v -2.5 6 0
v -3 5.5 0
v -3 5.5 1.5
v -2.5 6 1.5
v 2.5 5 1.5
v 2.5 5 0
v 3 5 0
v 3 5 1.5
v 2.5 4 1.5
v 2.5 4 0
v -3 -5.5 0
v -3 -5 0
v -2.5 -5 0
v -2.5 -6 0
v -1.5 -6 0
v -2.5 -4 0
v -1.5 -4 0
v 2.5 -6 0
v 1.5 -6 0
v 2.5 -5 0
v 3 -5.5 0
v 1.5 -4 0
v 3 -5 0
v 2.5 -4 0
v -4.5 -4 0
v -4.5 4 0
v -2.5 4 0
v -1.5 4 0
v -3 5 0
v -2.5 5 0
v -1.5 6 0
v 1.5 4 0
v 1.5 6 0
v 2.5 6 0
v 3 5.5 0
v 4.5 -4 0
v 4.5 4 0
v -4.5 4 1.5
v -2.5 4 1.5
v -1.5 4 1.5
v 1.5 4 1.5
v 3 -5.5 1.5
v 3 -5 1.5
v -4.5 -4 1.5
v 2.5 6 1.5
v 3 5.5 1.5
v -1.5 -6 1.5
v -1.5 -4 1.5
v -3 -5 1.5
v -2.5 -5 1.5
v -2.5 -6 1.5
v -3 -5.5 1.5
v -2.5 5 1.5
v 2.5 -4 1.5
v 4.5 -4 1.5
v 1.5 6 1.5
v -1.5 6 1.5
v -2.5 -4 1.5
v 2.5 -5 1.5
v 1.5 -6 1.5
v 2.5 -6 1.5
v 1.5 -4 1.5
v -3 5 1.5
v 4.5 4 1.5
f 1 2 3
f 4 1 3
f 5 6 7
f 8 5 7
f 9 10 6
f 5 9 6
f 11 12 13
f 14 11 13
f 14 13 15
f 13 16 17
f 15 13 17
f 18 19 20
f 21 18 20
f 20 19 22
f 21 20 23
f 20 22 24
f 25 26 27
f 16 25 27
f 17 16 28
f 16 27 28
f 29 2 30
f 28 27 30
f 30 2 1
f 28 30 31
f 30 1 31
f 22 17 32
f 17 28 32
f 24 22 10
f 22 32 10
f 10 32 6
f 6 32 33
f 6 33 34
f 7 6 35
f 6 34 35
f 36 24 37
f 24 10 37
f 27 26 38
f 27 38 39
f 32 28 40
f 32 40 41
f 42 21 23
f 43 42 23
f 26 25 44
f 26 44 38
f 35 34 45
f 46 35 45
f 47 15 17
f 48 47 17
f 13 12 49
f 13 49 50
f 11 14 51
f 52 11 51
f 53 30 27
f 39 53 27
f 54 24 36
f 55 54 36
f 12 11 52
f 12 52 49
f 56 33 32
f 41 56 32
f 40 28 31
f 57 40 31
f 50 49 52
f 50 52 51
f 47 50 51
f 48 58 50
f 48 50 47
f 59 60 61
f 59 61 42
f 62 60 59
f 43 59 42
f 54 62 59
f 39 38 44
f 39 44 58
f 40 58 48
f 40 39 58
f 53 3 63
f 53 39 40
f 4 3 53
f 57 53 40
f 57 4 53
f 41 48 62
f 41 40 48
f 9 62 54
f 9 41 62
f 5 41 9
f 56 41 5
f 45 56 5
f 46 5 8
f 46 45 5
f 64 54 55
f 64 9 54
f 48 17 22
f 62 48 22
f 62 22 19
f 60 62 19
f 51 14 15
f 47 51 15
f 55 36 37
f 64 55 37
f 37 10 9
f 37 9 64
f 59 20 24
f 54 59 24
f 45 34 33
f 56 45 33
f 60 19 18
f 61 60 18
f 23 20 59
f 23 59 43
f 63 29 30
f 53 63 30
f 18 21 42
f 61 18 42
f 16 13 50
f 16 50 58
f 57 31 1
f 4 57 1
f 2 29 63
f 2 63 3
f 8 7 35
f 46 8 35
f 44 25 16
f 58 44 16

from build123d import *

# Parameters (mm, degrees)
F0_W     = 1
F0_H     = 1
F0_W_2   = 2
F0_H_2   = 8
F0_W_3   = 3
F0_W_4   = 0.5
F1_DEPTH = 1.5
F2_SIZE  = 0.5


with BuildPart() as f1:
    # F0 (on Top) → F1 (new body)
    with BuildSketch(Plane.XY):
        with Locations((-2, 4.5)):
            Rectangle(F0_W, F0_H)
        with Locations((2, 4.5)):
            Rectangle(F0_W, F0_H)
        with Locations((3.5, 0)):
            Rectangle(F0_W_2, F0_H_2)
        with Locations((2, 0)):
            Rectangle(F0_W, F0_H_2)
        Rectangle(F0_W_3, F0_H_2)
        with Locations((-2, 0)):
            Rectangle(F0_W, F0_H_2)
        with Locations((-3.5, 0)):
            Rectangle(F0_W_2, F0_H_2)
        with Locations((-2, -4.5)):
            Rectangle(F0_W, F0_H)
        with Locations((2, -4.5)):
            Rectangle(F0_W, F0_H)
        with Locations((-2.75, 5.5)):
            Rectangle(F0_W_4, F0_H)
        with Locations((-2, 5.5)):
            Rectangle(F0_W, F0_H)
        with Locations((2, 5.5)):
            Rectangle(F0_W, F0_H)
        with Locations((2.75, 5.5)):
            Rectangle(F0_W_4, F0_H)
        with Locations((2, -5.5)):
            Rectangle(F0_W, F0_H)
        with Locations((2.75, -5.5)):
            Rectangle(F0_W_4, F0_H)
        with Locations((-2.75, -5.5)):
            Rectangle(F0_W_4, F0_H)
        with Locations((-2, -5.5)):
            Rectangle(F0_W, F0_H)
    extrude(amount=F1_DEPTH)

    # F2
    f2_edges = [f1.edges().sort_by_distance(p)[0] for p in [
        (-3, 6, 0.75),
        (3, 6, 0.75),
        (3, -6, 0.75),
        (-3, -6, 0.75),
    ]]
    chamfer(f2_edges, length=F2_SIZE)


solid = f1.part
